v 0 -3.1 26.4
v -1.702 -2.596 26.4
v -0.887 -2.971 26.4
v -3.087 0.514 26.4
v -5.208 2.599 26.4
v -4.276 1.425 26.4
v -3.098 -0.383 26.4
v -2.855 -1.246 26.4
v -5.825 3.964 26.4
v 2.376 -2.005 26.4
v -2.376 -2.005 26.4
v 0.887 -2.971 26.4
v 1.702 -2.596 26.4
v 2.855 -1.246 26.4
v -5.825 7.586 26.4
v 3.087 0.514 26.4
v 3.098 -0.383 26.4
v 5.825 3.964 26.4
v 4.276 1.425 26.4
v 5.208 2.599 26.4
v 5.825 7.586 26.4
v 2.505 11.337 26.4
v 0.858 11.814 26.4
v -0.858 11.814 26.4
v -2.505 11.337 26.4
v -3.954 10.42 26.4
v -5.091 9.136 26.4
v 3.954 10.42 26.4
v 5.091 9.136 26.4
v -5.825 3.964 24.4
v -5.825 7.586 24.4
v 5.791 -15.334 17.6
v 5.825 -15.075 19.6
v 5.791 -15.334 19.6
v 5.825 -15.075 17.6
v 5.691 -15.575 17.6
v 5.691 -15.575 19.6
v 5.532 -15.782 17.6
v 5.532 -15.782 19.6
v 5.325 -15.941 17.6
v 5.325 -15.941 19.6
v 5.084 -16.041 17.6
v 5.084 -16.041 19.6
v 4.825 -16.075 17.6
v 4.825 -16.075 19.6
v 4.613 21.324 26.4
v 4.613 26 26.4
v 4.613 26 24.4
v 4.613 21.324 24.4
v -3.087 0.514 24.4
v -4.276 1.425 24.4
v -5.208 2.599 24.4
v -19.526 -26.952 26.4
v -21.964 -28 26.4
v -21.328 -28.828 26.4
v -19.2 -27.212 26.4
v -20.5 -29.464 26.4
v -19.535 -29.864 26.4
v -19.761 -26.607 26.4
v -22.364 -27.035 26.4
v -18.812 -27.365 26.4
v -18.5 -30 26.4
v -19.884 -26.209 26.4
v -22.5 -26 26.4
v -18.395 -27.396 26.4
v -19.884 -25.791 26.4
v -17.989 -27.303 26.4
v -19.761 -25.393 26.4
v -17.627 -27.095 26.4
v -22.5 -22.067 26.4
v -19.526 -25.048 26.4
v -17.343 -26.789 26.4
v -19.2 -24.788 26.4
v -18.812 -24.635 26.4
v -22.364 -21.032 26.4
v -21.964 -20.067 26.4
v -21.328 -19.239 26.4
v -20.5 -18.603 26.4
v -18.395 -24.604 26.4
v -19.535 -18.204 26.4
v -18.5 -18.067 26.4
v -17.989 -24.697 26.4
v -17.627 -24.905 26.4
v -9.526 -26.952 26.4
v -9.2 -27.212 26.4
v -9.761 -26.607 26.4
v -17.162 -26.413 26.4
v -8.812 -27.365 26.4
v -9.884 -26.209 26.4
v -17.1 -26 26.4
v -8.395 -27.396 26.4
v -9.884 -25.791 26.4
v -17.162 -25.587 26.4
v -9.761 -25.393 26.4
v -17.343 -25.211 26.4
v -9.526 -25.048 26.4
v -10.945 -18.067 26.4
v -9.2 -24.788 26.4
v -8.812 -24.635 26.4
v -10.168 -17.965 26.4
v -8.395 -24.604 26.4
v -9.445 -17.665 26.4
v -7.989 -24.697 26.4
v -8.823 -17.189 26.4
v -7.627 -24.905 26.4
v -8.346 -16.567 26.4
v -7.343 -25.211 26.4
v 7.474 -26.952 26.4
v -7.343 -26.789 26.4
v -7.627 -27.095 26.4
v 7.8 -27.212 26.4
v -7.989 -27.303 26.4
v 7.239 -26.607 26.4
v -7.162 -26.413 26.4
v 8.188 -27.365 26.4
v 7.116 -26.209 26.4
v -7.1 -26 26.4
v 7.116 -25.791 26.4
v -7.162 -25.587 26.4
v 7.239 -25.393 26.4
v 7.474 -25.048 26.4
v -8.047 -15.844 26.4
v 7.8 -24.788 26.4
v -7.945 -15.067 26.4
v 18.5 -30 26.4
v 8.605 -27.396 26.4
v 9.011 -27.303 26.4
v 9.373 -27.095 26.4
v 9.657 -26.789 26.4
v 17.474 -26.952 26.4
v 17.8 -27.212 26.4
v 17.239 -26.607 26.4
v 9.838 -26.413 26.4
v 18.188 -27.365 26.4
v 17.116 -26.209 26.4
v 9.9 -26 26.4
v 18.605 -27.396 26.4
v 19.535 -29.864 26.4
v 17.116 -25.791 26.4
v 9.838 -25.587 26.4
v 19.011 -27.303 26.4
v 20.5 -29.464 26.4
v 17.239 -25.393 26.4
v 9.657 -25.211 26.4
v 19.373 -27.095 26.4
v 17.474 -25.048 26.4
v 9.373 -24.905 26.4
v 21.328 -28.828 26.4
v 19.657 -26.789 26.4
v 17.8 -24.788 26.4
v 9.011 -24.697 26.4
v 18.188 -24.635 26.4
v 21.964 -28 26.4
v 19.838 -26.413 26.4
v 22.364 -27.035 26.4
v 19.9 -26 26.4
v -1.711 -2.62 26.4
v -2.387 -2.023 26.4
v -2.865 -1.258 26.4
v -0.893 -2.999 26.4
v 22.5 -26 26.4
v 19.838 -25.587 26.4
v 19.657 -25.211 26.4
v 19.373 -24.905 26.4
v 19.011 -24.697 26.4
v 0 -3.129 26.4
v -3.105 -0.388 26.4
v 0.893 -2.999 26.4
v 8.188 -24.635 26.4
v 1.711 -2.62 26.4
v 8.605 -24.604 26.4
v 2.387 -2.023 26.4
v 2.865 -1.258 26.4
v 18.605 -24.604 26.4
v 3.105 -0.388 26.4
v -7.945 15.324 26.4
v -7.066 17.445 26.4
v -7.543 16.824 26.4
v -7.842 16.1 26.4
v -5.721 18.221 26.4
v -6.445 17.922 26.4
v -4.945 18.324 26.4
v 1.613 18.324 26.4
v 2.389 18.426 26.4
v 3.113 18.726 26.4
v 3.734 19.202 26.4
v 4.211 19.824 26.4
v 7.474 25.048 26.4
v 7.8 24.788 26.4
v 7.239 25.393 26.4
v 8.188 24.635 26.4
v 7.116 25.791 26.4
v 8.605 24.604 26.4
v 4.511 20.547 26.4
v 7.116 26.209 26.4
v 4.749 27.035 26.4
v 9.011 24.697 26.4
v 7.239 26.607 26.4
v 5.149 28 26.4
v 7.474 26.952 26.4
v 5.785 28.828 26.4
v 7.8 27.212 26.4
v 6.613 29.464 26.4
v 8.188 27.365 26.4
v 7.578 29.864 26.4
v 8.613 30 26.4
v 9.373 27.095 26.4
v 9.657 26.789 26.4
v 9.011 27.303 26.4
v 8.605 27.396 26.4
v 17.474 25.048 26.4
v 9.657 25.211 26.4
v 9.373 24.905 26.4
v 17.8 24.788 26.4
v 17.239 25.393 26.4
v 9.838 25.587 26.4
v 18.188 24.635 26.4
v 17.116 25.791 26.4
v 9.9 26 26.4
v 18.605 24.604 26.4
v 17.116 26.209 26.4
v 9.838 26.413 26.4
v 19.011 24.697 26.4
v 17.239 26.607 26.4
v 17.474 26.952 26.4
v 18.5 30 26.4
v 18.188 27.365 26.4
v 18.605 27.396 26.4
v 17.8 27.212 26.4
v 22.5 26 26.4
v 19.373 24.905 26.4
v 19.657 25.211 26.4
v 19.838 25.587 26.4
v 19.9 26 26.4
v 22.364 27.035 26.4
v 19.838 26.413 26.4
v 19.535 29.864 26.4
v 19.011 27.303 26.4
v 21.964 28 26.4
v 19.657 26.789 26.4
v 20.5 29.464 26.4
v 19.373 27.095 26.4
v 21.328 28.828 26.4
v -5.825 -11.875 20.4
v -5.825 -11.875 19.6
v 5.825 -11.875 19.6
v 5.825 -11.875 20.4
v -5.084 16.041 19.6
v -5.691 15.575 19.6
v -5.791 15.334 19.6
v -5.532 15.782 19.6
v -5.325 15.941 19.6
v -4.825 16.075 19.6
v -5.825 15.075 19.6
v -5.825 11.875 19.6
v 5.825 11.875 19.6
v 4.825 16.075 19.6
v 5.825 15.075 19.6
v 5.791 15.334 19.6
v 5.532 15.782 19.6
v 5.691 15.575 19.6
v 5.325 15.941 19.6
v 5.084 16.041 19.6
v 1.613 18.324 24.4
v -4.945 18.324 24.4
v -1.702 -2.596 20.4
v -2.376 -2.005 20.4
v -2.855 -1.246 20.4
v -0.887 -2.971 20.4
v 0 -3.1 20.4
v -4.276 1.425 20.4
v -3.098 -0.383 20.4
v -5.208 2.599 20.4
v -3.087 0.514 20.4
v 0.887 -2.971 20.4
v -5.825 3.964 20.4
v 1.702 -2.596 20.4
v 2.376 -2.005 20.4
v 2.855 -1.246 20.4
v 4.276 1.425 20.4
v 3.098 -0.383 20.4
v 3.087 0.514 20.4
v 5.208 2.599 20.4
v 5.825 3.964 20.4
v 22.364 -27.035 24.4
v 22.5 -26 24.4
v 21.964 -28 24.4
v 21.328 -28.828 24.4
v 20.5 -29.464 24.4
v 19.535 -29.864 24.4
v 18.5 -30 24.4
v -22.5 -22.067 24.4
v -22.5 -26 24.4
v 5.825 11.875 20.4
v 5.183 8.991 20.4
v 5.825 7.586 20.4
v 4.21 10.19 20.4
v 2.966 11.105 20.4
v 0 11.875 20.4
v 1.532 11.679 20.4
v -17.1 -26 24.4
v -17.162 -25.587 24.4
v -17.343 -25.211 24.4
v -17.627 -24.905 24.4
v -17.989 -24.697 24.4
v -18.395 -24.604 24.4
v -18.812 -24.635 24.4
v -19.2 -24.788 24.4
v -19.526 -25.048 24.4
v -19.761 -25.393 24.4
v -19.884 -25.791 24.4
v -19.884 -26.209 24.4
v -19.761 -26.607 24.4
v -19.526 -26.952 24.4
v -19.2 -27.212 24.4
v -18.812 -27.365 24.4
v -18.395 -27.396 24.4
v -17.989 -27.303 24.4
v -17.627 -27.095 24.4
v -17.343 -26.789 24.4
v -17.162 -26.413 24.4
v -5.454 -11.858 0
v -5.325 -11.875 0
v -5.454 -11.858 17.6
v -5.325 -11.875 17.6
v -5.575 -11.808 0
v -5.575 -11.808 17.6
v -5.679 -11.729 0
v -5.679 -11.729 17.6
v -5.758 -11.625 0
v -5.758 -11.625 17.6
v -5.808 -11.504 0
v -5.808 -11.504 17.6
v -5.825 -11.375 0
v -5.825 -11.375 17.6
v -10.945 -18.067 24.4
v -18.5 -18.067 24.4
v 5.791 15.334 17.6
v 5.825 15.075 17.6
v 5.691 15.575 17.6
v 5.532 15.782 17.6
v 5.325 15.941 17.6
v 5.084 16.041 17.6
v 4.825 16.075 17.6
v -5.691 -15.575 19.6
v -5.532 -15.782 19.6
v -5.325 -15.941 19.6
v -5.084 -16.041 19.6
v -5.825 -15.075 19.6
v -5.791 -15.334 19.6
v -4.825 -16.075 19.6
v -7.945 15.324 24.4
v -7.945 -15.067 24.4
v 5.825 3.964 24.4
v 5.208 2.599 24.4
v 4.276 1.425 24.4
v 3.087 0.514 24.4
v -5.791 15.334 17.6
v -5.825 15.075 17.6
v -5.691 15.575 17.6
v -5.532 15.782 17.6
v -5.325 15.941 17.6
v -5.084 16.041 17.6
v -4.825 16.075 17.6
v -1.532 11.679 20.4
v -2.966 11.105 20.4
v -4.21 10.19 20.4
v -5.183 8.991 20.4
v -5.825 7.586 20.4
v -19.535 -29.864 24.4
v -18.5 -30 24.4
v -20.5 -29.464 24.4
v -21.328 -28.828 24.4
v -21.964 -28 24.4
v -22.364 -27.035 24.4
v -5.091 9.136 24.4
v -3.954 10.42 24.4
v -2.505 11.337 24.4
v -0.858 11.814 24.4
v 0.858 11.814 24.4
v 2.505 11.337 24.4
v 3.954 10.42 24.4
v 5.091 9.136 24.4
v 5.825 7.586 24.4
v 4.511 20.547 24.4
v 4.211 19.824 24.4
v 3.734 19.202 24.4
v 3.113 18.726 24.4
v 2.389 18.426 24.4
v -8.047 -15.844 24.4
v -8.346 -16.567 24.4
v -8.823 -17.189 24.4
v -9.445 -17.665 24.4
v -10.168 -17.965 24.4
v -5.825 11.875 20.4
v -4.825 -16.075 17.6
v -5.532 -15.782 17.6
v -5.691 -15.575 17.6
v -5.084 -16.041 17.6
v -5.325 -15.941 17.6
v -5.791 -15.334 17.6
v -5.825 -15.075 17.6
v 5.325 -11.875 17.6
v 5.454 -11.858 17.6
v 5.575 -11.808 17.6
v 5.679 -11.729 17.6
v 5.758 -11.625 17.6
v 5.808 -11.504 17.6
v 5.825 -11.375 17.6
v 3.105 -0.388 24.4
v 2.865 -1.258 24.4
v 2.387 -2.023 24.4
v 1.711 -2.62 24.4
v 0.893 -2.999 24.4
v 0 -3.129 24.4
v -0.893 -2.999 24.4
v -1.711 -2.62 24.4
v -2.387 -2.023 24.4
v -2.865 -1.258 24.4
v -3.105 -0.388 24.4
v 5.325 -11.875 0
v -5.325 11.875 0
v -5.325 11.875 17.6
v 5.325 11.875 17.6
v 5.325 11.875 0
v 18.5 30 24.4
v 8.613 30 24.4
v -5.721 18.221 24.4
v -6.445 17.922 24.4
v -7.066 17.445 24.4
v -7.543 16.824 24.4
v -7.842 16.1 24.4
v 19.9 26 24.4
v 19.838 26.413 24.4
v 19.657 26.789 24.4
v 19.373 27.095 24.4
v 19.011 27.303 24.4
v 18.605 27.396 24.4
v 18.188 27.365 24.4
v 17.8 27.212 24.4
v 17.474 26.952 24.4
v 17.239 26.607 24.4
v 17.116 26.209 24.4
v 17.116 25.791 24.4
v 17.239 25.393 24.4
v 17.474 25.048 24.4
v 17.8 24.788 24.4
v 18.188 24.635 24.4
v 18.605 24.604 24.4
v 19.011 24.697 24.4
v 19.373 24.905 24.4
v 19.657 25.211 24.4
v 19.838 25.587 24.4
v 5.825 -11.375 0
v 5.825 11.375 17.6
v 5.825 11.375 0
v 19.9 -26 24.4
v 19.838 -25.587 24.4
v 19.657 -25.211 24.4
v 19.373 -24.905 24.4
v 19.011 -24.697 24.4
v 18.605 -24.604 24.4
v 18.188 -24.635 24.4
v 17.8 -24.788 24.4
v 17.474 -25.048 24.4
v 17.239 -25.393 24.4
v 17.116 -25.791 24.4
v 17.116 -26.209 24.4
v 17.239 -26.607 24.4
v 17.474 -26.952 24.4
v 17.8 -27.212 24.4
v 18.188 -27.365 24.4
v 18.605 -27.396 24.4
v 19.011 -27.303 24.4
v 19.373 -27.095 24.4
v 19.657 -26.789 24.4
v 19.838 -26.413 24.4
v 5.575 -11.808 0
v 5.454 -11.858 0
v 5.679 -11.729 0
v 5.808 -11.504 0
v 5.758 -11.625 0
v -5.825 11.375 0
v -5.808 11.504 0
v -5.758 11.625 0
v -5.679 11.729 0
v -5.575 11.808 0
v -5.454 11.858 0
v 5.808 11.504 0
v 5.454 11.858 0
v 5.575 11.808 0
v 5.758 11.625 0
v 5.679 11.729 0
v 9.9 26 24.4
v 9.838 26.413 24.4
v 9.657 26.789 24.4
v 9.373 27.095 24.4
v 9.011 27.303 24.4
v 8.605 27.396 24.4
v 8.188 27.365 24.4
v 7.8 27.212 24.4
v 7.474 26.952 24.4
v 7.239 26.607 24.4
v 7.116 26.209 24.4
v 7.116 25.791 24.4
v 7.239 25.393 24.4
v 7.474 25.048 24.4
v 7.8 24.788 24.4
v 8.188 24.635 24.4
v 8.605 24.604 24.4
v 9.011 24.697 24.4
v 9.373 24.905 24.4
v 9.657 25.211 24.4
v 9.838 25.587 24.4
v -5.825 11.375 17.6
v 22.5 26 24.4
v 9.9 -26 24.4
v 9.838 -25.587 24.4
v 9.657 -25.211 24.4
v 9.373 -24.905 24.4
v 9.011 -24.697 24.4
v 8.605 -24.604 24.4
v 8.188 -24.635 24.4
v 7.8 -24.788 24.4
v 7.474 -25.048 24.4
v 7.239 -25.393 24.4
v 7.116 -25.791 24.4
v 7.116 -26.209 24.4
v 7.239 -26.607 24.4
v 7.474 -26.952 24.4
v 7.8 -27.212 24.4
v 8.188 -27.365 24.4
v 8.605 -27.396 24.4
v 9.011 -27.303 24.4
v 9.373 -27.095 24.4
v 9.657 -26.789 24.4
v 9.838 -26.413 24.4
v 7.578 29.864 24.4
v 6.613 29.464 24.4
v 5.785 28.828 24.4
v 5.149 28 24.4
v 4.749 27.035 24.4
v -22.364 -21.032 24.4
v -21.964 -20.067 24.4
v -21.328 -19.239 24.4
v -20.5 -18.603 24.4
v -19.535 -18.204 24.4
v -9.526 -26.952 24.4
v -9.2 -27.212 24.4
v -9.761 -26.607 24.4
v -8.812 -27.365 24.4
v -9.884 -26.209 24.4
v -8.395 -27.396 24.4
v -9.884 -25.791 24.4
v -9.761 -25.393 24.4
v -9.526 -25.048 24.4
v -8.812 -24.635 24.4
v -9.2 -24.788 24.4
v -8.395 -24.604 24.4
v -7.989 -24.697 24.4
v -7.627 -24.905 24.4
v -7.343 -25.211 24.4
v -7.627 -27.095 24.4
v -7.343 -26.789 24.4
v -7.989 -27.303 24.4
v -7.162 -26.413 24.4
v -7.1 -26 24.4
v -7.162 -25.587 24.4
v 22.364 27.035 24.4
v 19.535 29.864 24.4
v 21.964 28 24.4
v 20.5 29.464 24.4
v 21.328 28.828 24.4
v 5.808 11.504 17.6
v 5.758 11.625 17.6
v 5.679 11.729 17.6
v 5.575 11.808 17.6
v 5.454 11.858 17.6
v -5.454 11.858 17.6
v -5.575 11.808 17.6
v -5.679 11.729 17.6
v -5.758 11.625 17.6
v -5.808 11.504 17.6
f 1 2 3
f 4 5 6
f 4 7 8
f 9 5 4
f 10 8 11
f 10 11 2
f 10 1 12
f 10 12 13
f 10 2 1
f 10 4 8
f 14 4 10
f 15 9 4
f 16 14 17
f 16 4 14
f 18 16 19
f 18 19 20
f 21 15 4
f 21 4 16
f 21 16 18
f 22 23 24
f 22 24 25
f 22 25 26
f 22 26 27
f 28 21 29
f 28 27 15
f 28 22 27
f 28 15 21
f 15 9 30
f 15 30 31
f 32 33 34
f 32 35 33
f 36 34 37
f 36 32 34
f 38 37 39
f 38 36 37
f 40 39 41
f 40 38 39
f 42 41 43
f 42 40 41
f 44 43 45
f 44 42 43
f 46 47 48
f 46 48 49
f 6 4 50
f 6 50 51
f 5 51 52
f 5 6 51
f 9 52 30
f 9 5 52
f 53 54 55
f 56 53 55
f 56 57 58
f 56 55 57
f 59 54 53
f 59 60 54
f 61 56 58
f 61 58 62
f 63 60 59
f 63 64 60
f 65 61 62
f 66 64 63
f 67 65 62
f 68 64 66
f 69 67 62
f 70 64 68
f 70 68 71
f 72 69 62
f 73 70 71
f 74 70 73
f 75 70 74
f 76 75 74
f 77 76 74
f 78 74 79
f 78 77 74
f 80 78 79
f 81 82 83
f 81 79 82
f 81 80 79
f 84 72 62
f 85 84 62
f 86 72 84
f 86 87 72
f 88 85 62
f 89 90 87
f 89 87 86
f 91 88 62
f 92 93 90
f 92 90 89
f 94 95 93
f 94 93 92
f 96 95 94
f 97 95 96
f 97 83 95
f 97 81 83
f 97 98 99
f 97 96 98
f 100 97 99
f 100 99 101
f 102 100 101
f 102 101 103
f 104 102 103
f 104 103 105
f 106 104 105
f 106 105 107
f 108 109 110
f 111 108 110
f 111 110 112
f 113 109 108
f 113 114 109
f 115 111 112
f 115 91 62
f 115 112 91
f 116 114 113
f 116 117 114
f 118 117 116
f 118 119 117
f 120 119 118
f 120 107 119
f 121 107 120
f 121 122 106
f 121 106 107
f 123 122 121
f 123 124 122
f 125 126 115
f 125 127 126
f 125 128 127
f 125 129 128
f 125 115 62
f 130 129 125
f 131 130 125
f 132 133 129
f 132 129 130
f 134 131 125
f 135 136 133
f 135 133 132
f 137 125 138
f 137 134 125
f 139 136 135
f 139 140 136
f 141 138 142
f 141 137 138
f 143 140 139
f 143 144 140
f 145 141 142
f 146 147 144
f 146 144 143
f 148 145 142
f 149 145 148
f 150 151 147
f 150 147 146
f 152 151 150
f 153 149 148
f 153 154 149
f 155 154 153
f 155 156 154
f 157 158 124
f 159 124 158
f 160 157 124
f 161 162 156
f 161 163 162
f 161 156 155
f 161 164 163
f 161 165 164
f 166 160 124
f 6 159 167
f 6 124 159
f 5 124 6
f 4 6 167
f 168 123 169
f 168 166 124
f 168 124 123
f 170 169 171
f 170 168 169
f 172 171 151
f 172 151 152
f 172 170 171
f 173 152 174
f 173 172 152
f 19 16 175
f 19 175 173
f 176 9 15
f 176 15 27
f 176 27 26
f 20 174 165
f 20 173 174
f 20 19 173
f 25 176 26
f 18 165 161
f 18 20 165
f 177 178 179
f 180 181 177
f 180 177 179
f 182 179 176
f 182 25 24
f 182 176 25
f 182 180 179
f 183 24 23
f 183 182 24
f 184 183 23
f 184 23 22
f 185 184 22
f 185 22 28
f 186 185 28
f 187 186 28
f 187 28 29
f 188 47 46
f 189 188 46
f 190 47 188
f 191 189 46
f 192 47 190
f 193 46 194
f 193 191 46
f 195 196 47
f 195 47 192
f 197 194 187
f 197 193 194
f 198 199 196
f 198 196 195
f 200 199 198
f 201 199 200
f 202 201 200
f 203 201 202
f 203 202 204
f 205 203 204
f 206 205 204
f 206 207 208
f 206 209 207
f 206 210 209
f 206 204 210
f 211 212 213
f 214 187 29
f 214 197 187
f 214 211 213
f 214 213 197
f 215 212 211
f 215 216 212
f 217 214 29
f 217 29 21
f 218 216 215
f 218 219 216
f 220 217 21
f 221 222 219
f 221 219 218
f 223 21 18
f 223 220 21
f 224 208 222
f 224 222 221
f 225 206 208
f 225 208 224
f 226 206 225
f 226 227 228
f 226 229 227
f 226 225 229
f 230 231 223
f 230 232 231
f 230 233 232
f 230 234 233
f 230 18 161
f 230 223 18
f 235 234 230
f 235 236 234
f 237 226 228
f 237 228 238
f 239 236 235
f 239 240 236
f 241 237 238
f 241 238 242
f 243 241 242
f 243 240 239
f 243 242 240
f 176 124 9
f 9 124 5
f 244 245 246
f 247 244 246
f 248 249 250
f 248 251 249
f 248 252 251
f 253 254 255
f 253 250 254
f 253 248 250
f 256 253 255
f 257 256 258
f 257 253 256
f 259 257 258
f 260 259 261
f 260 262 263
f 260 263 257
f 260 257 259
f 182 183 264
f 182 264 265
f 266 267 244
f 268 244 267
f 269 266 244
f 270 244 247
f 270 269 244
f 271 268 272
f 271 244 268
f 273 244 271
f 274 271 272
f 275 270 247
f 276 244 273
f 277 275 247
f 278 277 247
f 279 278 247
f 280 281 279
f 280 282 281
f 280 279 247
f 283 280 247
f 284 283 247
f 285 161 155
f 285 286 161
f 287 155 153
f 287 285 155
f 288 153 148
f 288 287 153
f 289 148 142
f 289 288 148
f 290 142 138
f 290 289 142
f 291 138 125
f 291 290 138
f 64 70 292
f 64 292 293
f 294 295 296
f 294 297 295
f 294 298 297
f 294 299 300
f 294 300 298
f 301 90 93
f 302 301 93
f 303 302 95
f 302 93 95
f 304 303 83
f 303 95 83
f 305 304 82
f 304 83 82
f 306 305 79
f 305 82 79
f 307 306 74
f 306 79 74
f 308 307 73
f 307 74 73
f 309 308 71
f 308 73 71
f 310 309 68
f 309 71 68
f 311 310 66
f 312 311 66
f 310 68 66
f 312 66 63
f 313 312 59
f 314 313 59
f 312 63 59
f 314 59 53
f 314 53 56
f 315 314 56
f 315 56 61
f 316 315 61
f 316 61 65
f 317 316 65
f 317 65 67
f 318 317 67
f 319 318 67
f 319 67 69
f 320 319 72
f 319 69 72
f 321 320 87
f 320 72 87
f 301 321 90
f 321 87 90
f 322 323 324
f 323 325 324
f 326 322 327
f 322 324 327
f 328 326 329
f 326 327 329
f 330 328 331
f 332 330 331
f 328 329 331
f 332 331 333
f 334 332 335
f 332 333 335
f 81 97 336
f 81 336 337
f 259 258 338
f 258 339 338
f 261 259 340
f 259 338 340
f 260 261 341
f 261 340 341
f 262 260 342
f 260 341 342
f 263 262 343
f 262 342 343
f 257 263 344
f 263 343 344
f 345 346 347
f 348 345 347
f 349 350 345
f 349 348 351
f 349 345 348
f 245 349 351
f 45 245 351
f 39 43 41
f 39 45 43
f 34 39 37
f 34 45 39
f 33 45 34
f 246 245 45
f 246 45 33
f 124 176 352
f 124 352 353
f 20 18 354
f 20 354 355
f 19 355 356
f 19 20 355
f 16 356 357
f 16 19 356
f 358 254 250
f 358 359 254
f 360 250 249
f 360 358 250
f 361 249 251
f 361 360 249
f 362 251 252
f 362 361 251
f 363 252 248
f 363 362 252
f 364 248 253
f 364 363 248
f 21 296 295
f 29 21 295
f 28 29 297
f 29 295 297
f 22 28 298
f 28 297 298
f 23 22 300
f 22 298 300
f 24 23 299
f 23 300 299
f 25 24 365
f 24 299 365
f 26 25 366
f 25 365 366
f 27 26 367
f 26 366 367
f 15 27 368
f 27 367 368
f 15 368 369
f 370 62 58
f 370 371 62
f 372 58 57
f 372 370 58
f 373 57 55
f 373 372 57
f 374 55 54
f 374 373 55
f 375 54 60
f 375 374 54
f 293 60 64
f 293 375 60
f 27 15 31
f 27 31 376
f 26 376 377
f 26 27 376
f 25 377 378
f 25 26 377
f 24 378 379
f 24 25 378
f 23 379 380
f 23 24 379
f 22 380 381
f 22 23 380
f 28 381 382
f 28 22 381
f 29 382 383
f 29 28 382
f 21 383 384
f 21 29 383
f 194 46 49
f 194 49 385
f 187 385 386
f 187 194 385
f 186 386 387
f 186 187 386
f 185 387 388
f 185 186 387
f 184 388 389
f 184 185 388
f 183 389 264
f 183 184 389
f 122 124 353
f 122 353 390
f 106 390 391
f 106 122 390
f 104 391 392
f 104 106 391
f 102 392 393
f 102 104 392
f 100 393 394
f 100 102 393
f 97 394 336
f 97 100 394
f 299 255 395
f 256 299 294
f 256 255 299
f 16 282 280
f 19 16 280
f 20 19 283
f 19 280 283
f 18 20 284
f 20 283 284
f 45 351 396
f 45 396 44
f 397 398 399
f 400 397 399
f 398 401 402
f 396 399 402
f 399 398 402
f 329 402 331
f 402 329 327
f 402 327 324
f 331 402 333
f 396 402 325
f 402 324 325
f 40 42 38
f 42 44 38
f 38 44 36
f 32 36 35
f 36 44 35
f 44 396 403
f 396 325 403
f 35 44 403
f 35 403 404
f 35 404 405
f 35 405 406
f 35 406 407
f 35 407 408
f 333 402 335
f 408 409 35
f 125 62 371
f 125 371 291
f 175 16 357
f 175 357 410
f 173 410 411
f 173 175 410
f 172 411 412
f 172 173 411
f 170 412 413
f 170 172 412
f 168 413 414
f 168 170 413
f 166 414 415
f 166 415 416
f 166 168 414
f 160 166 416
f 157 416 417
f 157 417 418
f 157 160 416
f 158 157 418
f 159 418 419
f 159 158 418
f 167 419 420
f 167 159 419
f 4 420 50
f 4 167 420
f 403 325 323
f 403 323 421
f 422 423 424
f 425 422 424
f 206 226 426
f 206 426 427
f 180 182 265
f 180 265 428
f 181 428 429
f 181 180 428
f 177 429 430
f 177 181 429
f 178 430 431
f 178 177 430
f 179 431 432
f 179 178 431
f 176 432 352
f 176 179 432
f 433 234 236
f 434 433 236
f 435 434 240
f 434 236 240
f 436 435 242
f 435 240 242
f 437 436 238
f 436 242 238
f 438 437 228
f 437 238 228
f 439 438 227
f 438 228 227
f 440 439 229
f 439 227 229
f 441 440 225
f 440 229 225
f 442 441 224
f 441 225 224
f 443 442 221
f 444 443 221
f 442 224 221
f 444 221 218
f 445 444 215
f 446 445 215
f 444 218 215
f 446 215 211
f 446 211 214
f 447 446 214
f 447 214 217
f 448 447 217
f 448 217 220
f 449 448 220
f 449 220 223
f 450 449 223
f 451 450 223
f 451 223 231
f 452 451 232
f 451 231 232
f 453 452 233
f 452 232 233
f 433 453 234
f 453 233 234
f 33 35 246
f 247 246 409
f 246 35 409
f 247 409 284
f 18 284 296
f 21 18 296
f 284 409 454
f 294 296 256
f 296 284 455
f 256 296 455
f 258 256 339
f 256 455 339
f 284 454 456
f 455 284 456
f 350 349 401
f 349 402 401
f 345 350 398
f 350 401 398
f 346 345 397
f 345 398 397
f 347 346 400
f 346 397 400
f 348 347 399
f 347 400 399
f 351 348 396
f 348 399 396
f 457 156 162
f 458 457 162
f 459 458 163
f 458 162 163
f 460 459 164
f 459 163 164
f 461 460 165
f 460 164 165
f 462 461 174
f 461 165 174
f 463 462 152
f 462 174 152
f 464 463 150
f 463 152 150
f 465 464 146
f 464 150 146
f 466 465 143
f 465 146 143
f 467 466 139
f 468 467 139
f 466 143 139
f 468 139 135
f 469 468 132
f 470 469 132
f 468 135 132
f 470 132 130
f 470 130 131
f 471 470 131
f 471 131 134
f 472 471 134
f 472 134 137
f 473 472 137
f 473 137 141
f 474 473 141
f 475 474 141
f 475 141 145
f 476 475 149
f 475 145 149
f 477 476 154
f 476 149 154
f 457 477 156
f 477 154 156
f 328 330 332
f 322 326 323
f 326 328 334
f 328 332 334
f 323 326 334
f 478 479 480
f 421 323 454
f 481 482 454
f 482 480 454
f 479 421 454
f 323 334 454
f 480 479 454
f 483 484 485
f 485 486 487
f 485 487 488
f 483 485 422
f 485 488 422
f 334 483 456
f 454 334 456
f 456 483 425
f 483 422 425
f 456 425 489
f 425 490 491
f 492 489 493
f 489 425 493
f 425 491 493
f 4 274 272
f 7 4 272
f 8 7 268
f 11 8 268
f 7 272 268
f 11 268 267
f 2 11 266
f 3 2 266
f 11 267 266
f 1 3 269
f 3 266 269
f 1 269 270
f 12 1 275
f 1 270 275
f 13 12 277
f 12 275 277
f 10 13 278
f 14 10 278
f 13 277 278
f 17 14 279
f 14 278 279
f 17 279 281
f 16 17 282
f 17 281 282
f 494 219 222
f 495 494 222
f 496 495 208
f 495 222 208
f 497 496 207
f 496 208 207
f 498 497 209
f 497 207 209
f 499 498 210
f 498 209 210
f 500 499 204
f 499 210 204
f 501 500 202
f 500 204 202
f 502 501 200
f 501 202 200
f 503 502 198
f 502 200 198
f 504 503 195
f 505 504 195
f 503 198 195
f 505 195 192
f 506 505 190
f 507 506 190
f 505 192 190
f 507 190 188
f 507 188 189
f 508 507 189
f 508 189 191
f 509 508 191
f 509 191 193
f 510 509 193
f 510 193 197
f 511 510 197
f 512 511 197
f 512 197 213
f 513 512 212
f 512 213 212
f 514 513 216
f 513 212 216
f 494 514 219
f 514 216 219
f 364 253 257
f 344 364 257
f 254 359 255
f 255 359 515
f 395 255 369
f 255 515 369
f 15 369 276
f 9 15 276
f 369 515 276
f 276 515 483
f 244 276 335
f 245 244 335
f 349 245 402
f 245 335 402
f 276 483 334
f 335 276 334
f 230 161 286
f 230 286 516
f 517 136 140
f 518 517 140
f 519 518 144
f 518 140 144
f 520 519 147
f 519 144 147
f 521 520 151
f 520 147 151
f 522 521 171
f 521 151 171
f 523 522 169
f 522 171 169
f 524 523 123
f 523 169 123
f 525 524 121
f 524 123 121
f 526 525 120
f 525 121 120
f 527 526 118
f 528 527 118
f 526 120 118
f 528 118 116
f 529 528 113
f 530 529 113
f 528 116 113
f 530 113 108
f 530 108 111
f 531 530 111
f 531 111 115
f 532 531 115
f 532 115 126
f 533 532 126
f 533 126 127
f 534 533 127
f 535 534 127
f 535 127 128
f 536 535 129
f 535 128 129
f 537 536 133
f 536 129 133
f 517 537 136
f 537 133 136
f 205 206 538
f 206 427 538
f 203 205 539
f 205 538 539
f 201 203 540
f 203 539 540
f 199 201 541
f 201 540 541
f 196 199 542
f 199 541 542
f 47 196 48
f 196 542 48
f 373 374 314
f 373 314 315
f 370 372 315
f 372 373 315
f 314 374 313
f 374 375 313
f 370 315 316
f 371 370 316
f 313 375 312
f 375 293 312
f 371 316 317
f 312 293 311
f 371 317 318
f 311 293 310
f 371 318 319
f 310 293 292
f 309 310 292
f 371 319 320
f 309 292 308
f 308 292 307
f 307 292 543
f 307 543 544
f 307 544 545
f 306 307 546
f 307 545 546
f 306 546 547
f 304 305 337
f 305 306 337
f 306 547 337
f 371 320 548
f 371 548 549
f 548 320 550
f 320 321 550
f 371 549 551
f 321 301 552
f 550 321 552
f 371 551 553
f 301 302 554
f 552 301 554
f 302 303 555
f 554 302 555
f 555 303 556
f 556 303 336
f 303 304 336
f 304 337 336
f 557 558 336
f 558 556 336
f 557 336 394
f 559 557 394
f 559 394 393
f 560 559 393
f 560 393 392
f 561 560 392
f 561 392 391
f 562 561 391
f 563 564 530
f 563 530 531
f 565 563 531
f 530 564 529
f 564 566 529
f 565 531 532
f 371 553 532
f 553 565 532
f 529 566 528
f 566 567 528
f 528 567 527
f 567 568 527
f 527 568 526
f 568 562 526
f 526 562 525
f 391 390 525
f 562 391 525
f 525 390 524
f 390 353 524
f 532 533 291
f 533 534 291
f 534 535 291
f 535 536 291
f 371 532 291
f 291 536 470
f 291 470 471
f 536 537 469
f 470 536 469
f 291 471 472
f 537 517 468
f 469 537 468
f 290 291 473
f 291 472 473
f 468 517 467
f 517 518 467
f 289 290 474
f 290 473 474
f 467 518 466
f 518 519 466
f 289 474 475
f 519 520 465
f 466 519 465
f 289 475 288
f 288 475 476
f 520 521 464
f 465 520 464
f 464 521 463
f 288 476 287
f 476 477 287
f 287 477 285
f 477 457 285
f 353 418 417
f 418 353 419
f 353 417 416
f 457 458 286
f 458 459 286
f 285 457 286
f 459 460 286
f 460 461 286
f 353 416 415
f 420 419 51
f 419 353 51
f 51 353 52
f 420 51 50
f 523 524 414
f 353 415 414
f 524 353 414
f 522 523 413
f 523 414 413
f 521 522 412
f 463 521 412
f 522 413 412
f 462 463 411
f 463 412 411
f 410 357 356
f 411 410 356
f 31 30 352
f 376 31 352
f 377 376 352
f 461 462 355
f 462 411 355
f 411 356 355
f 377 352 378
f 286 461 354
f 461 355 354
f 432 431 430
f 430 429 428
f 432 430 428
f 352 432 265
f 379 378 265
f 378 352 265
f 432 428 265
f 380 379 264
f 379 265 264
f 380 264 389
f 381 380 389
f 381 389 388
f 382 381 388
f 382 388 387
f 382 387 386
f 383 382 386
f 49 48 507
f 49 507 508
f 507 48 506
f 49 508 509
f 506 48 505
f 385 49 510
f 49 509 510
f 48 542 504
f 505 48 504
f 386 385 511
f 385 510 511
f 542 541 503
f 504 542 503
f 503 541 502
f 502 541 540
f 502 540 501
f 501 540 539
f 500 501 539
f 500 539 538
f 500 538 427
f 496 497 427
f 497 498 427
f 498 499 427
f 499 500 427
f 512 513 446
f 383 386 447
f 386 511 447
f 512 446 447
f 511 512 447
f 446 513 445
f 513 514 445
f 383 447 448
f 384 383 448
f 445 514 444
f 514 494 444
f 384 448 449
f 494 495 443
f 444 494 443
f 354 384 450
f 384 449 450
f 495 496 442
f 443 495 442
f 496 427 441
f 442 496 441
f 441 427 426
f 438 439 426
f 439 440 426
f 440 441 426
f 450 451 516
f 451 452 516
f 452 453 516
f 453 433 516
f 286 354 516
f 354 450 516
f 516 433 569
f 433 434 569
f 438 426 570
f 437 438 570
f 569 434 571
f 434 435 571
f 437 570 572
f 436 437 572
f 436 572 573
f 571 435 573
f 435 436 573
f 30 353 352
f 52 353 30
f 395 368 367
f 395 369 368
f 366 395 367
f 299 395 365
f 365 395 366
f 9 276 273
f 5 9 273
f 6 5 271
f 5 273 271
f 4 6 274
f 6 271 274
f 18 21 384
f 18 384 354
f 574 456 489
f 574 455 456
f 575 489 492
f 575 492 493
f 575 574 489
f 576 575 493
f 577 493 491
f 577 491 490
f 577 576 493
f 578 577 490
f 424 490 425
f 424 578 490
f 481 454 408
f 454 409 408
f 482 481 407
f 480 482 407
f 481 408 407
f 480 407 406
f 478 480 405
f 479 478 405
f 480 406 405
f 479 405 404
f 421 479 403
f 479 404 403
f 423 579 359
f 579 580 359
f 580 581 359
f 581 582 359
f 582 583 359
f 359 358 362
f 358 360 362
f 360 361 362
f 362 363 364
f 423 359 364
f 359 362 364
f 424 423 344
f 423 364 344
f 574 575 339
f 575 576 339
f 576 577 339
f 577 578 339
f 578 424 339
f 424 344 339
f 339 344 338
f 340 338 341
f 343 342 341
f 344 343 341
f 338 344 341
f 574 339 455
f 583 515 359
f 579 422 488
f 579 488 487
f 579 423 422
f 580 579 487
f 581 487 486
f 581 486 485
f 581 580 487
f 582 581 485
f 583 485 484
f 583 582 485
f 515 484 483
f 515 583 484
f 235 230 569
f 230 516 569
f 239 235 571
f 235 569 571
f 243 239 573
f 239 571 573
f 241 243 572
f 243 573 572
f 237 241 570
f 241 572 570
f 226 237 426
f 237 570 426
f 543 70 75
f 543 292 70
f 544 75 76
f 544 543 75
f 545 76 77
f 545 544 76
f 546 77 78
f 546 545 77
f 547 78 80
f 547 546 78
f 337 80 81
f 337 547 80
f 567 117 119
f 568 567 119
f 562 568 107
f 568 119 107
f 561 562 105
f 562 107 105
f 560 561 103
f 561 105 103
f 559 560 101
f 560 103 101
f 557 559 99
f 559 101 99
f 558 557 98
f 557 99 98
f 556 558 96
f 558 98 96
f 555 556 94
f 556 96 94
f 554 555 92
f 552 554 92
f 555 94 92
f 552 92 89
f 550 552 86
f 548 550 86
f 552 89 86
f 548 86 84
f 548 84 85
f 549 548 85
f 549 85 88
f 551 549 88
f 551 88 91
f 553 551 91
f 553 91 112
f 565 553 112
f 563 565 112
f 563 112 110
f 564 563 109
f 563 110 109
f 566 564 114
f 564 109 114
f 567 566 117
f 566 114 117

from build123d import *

# Parameters (mm, degrees)
F0_W     = 11.65
F0_H     = 23.75
F1_DEPTH = 20.4
F3_DEPTH = 6
F5_START = -0.8
F4_W     = 11.65
F4_H     = 4.2
F5_DEPTH = 2
F6_R     = 0.5
F7_R     = 1
F8_R     = 1.4
F9_DEPTH = 2
F10_R    = 4


with BuildPart() as f1:
    # F0 (on Top) → F1 (new body)
    with BuildSketch(Plane.XY):
        Rectangle(F0_W, F0_H)
    extrude(amount=F1_DEPTH)

    # F2 (on face) → F3 (join)
    with BuildSketch(Plane.XY.offset(20.4)):
        with BuildLine():
            Line((5.825, 3.9640955299), (5.825, 7.5859044701))
            ThreePointArc((5.825, 7.5859044701), (0, 11.875), (-5.825, 7.5859044701))
            Line((-5.825, 7.5859044701), (-5.825, 3.9640955299))
            ThreePointArc((-5.825, 3.9640955299), (-4.7781429098, 1.9829886164), (-3.0865775367, 0.5135326087))
            ThreePointArc((-3.0865775367, 0.5135326087), (0, -3.1), (3.0865775367, 0.5135326087))
            ThreePointArc((3.0865775367, 0.5135326087), (4.7781429098, 1.9829886164), (5.825, 3.9640955299))
        make_face()
    extrude(amount=F3_DEPTH)

    # F4 (on face) → F5 (join)
    with BuildSketch(Plane.XY.offset(20.4).offset(F5_START)):
        with Locations((0, -13.975)):
            Rectangle(F4_W, F4_H)
        with Locations((0, 13.975)):
            Rectangle(F4_W, F4_H)
    extrude(amount=-F5_DEPTH)

    # F6
    f6_edges = [f1.edges().sort_by_distance(p)[0] for p in [
        (5.825, 11.875, 8.8),
        (5.825, -11.875, 8.8),
        (-5.825, -11.875, 8.8),
        (-5.825, 11.875, 8.8),
    ]]
    fillet(f6_edges, radius=F6_R)

    # F7
    f7_edges = [f1.edges().sort_by_distance(p)[0] for p in [
        (-5.825, 16.075, 18.6),
        (5.825, 16.075, 18.6),
        (5.825, -16.075, 18.6),
        (-5.825, -16.075, 18.6),
    ]]
    fillet(f7_edges, radius=F7_R)


with BuildPart() as f9:
    # F8 (on face) → F9 (new body)
    with BuildSketch(Plane.XY.offset(26.4)):
        with BuildLine():
            Line((22.5, -30), (22.5, 30))
            Line((22.5, 30), (4.6129450202, 30))
            Line((4.6129450202, 30), (4.6129450202, 21.3236394078))
            ThreePointArc((4.6129450202, 21.3236394078), (3.7342653638, 19.2023190642), (1.6129450202, 18.3236394078))
            Line((1.6129450202, 18.3236394078), (-4.9445159063, 18.3236394078))
            ThreePointArc((-4.9445159063, 18.3236394078), (-7.0658362498, 17.4449597513), (-7.9445159063, 15.3236394078))
            Line((-7.9445159063, 15.3236394078), (-7.9445159063, -15.0673655123))
            ThreePointArc((-7.9445159063, -15.0673655123), (-8.8231955627, -17.1886858558), (-10.9445159063, -18.0673655123))
            Line((-10.9445159063, -18.0673655123), (-22.5, -18.0673655123))
            Line((-22.5, -18.0673655123), (-22.5, -30))
            Line((-22.5, -30), (22.5, -30))
        make_face()
        with Locations((-18.5, -26)):
            Circle(F8_R, mode=Mode.SUBTRACT)
        with Locations((-8.5, -26)):
            Circle(F8_R, mode=Mode.SUBTRACT)
        with Locations((8.5, -26)):
            Circle(F8_R, mode=Mode.SUBTRACT)
        with Locations((18.5, -26)):
            Circle(F8_R, mode=Mode.SUBTRACT)
        with BuildLine():
            ThreePointArc((5.825, 3.9640955299), (4.7781429098, 1.9829886164), (3.0865775367, 0.5135326087))
            ThreePointArc((3.0865775367, 0.5135326087), (0, -3.1290056936), (-3.0865775367, 0.5135326087))
            ThreePointArc((-3.0865775367, 0.5135326087), (-4.7781429098, 1.9829886164), (-5.825, 3.9640955299))
            Line((-5.825, 3.9640955299), (-5.825, 7.5859044701))
            ThreePointArc((-5.825, 7.5859044701), (0, 11.875), (5.825, 7.5859044701))
            Line((5.825, 7.5859044701), (5.825, 3.9640955299))
        make_face(mode=Mode.SUBTRACT)
        with Locations((8.5, 26)):
            Circle(F8_R, mode=Mode.SUBTRACT)
        with Locations((18.5, 26)):
            Circle(F8_R, mode=Mode.SUBTRACT)
    extrude(amount=-F9_DEPTH)

    # F10
    f10_edges = [f9.edges().sort_by_distance(p)[0] for p in [
        (-22.5, -30, 25.4),
        (22.5, 30, 25.4),
        (22.5, -30, 25.4),
        (4.612945, 30, 25.4),
        (-22.5, -18.067366, 25.4),
    ]]
    fillet(f10_edges, radius=F10_R)


with BuildPart() as f11_1:
    # F11: copy of F9
    add(f9.part)


solid = Compound([f1.part, f9.part])
